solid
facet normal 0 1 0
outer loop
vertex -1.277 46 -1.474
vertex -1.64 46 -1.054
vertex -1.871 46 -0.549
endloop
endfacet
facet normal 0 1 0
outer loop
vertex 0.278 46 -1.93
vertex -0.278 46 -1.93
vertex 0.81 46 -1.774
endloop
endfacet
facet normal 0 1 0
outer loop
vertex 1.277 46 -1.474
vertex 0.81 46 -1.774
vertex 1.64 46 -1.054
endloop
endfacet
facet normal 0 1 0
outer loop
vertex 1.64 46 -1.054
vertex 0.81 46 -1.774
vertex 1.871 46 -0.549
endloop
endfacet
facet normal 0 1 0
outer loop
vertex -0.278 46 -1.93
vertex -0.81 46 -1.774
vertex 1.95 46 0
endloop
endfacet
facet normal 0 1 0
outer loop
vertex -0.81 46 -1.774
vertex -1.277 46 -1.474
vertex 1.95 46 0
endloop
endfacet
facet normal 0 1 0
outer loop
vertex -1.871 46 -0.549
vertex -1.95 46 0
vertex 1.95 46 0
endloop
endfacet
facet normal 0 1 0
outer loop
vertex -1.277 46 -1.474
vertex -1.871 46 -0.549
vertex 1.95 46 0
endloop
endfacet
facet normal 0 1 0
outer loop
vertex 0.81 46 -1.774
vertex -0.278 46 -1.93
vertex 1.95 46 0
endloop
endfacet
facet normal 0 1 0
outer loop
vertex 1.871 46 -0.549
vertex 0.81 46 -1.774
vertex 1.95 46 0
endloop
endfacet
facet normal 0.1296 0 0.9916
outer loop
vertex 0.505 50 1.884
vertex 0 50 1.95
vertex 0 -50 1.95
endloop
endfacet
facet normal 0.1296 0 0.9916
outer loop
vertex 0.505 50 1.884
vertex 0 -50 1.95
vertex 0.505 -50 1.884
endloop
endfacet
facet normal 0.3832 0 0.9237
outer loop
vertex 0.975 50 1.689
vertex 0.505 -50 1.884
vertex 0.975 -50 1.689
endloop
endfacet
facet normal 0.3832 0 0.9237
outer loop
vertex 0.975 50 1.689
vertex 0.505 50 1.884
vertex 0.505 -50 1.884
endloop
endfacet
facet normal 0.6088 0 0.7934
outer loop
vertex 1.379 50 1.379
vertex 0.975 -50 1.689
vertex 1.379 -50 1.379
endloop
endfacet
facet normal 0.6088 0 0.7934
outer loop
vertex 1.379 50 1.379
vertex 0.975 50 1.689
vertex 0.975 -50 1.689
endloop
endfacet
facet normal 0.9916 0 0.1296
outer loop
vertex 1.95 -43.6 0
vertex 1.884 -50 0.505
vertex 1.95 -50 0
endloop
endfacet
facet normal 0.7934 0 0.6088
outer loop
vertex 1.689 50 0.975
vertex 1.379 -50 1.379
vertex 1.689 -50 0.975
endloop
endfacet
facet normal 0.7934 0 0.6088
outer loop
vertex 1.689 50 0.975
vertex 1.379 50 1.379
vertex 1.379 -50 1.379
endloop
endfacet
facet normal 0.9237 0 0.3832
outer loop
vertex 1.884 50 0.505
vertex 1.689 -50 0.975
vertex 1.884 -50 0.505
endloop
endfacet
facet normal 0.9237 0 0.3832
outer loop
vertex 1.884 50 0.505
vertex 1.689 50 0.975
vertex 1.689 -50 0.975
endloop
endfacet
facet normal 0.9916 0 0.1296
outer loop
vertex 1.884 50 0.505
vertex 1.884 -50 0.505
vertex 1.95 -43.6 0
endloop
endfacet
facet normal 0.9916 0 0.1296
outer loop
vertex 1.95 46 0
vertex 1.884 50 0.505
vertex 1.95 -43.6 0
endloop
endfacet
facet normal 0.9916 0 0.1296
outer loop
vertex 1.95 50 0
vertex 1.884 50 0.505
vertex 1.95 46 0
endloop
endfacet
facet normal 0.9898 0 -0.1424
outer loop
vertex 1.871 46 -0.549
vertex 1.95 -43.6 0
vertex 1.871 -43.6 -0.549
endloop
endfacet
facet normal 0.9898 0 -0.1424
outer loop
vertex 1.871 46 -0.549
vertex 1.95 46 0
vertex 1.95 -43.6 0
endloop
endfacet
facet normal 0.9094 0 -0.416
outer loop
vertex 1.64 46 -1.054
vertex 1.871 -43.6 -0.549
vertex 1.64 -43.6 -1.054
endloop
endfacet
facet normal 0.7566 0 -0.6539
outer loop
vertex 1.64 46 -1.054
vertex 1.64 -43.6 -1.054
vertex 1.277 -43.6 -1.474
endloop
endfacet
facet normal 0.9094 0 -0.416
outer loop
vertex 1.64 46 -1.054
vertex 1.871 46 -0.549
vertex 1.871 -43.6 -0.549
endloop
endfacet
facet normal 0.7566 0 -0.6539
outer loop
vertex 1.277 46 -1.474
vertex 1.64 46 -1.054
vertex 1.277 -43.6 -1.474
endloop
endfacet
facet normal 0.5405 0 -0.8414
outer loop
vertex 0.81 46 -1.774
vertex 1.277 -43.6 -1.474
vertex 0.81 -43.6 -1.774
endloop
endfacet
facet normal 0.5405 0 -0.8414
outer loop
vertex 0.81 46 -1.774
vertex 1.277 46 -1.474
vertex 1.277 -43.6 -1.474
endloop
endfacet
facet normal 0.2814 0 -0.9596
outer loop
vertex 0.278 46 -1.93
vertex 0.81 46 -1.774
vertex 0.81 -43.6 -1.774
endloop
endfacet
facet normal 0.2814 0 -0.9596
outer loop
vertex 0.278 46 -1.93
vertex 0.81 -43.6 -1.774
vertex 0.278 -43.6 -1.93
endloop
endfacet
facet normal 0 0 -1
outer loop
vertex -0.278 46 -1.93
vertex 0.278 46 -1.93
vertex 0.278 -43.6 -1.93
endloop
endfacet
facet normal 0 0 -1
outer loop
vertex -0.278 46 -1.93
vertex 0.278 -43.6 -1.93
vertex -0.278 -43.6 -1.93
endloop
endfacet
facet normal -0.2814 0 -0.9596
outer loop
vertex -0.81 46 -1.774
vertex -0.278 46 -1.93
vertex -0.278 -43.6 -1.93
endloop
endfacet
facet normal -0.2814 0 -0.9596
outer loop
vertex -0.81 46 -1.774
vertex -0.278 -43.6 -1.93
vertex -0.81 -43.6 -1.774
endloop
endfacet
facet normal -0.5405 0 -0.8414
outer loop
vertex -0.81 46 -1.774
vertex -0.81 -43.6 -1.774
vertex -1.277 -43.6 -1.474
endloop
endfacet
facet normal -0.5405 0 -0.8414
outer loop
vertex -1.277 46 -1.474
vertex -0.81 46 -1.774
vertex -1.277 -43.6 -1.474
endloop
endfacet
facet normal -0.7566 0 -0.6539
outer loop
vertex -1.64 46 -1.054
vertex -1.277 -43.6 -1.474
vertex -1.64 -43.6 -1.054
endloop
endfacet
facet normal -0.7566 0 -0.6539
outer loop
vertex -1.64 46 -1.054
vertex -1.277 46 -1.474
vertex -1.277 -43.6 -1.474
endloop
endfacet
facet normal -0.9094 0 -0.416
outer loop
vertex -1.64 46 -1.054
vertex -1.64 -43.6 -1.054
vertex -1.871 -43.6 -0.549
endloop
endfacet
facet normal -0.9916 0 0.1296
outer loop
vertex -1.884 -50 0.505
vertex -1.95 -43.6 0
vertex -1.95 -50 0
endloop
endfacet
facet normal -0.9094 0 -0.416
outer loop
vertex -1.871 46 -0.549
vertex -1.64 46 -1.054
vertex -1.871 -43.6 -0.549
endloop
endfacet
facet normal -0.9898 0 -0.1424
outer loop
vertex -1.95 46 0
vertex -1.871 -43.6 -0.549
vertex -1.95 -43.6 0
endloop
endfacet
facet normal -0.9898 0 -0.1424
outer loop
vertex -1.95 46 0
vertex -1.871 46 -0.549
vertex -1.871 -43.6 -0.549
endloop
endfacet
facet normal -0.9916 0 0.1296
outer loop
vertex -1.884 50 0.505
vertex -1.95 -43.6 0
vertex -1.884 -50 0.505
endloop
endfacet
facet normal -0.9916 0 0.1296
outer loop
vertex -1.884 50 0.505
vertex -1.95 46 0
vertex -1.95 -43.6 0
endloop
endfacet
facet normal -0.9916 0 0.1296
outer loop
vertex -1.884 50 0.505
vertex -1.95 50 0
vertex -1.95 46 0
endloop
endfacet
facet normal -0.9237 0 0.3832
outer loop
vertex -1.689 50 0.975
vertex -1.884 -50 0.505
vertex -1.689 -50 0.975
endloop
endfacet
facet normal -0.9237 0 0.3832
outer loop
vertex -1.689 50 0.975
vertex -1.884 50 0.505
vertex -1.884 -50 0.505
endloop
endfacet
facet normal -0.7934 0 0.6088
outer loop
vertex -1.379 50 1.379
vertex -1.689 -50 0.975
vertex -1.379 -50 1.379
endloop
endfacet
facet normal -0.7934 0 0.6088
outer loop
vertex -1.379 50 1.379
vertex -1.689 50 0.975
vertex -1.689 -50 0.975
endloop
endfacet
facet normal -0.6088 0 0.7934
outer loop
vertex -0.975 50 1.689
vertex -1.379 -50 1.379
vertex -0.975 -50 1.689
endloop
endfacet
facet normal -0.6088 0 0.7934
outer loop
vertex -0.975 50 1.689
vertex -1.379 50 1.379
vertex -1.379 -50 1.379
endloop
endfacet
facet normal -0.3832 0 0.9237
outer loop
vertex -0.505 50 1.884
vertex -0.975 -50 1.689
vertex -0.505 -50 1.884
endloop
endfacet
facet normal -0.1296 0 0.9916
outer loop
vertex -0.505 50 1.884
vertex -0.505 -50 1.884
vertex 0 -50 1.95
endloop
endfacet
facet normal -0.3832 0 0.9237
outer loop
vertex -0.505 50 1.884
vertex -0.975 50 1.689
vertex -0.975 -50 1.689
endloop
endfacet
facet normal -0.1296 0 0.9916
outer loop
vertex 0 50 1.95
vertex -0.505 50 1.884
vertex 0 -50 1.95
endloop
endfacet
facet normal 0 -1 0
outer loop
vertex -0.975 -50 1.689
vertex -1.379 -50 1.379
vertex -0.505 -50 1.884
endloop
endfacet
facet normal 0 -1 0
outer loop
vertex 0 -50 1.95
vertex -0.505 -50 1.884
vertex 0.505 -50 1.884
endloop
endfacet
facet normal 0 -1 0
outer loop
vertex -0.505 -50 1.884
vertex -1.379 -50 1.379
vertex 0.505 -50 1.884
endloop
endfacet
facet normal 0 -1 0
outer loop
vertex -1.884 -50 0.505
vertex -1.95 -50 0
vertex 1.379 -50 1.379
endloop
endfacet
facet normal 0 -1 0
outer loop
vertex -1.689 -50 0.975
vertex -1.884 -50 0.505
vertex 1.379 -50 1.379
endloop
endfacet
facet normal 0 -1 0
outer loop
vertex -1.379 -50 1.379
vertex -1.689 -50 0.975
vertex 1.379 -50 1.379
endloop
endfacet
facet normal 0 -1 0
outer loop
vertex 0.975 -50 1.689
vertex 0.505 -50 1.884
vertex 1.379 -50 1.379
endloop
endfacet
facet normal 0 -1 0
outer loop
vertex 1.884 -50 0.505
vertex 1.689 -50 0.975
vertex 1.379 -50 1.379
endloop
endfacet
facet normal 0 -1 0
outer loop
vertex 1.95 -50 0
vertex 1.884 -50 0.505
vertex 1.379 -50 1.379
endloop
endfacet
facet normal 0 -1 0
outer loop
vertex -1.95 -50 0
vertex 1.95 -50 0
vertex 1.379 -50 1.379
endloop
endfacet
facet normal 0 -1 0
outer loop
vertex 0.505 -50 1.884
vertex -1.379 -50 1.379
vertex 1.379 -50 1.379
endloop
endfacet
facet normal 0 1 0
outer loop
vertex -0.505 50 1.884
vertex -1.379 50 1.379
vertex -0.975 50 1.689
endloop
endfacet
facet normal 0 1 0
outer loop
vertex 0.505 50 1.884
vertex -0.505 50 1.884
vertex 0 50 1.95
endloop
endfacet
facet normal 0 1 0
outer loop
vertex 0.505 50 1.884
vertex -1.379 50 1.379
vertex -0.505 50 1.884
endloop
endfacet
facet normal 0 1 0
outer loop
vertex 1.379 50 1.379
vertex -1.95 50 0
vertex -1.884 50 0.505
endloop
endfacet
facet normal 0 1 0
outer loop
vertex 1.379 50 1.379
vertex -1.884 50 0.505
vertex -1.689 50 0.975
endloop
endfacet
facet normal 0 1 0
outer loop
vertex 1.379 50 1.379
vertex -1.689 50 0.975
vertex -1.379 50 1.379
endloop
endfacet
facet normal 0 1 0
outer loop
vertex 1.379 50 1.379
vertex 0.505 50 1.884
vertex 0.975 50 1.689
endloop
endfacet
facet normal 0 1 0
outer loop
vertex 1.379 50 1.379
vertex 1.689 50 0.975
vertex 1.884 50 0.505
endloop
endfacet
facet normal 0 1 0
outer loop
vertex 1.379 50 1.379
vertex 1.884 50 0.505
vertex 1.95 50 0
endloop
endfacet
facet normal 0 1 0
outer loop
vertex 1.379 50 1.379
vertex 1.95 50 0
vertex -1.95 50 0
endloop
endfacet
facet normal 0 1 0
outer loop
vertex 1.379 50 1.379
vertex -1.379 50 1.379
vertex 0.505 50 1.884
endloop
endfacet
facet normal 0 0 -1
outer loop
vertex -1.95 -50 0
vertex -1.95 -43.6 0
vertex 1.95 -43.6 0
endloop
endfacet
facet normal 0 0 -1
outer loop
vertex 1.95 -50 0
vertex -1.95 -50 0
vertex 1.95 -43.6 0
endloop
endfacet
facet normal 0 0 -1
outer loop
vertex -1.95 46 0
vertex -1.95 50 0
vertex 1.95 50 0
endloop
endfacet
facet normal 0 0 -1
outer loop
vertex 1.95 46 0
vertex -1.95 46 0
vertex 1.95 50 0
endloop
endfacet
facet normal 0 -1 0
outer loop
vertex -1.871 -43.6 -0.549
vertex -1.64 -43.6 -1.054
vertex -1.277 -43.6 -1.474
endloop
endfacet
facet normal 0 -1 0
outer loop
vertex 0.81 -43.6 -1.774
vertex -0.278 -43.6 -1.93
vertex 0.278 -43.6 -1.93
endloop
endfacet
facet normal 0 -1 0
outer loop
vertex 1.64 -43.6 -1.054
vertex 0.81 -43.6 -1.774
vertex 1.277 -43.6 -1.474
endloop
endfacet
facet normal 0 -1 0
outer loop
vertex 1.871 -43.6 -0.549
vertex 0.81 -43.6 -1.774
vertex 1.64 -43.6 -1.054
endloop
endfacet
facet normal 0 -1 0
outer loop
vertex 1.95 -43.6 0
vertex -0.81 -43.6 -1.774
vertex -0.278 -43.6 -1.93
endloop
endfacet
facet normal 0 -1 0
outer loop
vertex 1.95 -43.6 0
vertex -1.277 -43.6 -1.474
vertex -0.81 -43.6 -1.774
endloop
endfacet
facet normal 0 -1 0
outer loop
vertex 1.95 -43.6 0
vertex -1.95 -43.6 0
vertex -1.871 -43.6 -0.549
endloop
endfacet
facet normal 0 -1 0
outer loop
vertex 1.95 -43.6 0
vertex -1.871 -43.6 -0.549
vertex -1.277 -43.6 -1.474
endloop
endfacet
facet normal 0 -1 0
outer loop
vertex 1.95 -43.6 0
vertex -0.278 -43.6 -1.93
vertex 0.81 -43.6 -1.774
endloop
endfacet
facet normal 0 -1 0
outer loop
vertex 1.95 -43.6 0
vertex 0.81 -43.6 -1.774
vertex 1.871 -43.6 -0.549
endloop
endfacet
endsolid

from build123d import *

# Parameters (mm, degrees)
SKETCH1_R           = 1.95
BOSS_EXTRUDE1_DEPTH = 50
SKETCH2_W           = 3.9
SKETCH2_H           = 4
SKETCH2_H_2         = 6.4
CUT_EXTRUDE1_DEPTH  = 51.075992252


with BuildPart() as part:
    # Sketch1 → Boss-Extrude1 (new, symmetric)
    with BuildSketch(Plane(origin=(0, 0, 0), x_dir=(1, 0, 0), z_dir=(0, 1, 0))):
        with Locations(Location((0, 0, 0), (0, 0, 270))):
            Circle(SKETCH1_R)
    extrude(amount=BOSS_EXTRUDE1_DEPTH, both=True)

    # Sketch2 → Cut-Extrude1 (cut, through all)
    with BuildSketch(Plane.XY):
        with Locations((0, 48)):
            Rectangle(SKETCH2_W, SKETCH2_H)
        with Locations((0, -46.8)):
            Rectangle(SKETCH2_W, SKETCH2_H_2)
    extrude(amount=-CUT_EXTRUDE1_DEPTH, mode=Mode.SUBTRACT)


solid = part.part
